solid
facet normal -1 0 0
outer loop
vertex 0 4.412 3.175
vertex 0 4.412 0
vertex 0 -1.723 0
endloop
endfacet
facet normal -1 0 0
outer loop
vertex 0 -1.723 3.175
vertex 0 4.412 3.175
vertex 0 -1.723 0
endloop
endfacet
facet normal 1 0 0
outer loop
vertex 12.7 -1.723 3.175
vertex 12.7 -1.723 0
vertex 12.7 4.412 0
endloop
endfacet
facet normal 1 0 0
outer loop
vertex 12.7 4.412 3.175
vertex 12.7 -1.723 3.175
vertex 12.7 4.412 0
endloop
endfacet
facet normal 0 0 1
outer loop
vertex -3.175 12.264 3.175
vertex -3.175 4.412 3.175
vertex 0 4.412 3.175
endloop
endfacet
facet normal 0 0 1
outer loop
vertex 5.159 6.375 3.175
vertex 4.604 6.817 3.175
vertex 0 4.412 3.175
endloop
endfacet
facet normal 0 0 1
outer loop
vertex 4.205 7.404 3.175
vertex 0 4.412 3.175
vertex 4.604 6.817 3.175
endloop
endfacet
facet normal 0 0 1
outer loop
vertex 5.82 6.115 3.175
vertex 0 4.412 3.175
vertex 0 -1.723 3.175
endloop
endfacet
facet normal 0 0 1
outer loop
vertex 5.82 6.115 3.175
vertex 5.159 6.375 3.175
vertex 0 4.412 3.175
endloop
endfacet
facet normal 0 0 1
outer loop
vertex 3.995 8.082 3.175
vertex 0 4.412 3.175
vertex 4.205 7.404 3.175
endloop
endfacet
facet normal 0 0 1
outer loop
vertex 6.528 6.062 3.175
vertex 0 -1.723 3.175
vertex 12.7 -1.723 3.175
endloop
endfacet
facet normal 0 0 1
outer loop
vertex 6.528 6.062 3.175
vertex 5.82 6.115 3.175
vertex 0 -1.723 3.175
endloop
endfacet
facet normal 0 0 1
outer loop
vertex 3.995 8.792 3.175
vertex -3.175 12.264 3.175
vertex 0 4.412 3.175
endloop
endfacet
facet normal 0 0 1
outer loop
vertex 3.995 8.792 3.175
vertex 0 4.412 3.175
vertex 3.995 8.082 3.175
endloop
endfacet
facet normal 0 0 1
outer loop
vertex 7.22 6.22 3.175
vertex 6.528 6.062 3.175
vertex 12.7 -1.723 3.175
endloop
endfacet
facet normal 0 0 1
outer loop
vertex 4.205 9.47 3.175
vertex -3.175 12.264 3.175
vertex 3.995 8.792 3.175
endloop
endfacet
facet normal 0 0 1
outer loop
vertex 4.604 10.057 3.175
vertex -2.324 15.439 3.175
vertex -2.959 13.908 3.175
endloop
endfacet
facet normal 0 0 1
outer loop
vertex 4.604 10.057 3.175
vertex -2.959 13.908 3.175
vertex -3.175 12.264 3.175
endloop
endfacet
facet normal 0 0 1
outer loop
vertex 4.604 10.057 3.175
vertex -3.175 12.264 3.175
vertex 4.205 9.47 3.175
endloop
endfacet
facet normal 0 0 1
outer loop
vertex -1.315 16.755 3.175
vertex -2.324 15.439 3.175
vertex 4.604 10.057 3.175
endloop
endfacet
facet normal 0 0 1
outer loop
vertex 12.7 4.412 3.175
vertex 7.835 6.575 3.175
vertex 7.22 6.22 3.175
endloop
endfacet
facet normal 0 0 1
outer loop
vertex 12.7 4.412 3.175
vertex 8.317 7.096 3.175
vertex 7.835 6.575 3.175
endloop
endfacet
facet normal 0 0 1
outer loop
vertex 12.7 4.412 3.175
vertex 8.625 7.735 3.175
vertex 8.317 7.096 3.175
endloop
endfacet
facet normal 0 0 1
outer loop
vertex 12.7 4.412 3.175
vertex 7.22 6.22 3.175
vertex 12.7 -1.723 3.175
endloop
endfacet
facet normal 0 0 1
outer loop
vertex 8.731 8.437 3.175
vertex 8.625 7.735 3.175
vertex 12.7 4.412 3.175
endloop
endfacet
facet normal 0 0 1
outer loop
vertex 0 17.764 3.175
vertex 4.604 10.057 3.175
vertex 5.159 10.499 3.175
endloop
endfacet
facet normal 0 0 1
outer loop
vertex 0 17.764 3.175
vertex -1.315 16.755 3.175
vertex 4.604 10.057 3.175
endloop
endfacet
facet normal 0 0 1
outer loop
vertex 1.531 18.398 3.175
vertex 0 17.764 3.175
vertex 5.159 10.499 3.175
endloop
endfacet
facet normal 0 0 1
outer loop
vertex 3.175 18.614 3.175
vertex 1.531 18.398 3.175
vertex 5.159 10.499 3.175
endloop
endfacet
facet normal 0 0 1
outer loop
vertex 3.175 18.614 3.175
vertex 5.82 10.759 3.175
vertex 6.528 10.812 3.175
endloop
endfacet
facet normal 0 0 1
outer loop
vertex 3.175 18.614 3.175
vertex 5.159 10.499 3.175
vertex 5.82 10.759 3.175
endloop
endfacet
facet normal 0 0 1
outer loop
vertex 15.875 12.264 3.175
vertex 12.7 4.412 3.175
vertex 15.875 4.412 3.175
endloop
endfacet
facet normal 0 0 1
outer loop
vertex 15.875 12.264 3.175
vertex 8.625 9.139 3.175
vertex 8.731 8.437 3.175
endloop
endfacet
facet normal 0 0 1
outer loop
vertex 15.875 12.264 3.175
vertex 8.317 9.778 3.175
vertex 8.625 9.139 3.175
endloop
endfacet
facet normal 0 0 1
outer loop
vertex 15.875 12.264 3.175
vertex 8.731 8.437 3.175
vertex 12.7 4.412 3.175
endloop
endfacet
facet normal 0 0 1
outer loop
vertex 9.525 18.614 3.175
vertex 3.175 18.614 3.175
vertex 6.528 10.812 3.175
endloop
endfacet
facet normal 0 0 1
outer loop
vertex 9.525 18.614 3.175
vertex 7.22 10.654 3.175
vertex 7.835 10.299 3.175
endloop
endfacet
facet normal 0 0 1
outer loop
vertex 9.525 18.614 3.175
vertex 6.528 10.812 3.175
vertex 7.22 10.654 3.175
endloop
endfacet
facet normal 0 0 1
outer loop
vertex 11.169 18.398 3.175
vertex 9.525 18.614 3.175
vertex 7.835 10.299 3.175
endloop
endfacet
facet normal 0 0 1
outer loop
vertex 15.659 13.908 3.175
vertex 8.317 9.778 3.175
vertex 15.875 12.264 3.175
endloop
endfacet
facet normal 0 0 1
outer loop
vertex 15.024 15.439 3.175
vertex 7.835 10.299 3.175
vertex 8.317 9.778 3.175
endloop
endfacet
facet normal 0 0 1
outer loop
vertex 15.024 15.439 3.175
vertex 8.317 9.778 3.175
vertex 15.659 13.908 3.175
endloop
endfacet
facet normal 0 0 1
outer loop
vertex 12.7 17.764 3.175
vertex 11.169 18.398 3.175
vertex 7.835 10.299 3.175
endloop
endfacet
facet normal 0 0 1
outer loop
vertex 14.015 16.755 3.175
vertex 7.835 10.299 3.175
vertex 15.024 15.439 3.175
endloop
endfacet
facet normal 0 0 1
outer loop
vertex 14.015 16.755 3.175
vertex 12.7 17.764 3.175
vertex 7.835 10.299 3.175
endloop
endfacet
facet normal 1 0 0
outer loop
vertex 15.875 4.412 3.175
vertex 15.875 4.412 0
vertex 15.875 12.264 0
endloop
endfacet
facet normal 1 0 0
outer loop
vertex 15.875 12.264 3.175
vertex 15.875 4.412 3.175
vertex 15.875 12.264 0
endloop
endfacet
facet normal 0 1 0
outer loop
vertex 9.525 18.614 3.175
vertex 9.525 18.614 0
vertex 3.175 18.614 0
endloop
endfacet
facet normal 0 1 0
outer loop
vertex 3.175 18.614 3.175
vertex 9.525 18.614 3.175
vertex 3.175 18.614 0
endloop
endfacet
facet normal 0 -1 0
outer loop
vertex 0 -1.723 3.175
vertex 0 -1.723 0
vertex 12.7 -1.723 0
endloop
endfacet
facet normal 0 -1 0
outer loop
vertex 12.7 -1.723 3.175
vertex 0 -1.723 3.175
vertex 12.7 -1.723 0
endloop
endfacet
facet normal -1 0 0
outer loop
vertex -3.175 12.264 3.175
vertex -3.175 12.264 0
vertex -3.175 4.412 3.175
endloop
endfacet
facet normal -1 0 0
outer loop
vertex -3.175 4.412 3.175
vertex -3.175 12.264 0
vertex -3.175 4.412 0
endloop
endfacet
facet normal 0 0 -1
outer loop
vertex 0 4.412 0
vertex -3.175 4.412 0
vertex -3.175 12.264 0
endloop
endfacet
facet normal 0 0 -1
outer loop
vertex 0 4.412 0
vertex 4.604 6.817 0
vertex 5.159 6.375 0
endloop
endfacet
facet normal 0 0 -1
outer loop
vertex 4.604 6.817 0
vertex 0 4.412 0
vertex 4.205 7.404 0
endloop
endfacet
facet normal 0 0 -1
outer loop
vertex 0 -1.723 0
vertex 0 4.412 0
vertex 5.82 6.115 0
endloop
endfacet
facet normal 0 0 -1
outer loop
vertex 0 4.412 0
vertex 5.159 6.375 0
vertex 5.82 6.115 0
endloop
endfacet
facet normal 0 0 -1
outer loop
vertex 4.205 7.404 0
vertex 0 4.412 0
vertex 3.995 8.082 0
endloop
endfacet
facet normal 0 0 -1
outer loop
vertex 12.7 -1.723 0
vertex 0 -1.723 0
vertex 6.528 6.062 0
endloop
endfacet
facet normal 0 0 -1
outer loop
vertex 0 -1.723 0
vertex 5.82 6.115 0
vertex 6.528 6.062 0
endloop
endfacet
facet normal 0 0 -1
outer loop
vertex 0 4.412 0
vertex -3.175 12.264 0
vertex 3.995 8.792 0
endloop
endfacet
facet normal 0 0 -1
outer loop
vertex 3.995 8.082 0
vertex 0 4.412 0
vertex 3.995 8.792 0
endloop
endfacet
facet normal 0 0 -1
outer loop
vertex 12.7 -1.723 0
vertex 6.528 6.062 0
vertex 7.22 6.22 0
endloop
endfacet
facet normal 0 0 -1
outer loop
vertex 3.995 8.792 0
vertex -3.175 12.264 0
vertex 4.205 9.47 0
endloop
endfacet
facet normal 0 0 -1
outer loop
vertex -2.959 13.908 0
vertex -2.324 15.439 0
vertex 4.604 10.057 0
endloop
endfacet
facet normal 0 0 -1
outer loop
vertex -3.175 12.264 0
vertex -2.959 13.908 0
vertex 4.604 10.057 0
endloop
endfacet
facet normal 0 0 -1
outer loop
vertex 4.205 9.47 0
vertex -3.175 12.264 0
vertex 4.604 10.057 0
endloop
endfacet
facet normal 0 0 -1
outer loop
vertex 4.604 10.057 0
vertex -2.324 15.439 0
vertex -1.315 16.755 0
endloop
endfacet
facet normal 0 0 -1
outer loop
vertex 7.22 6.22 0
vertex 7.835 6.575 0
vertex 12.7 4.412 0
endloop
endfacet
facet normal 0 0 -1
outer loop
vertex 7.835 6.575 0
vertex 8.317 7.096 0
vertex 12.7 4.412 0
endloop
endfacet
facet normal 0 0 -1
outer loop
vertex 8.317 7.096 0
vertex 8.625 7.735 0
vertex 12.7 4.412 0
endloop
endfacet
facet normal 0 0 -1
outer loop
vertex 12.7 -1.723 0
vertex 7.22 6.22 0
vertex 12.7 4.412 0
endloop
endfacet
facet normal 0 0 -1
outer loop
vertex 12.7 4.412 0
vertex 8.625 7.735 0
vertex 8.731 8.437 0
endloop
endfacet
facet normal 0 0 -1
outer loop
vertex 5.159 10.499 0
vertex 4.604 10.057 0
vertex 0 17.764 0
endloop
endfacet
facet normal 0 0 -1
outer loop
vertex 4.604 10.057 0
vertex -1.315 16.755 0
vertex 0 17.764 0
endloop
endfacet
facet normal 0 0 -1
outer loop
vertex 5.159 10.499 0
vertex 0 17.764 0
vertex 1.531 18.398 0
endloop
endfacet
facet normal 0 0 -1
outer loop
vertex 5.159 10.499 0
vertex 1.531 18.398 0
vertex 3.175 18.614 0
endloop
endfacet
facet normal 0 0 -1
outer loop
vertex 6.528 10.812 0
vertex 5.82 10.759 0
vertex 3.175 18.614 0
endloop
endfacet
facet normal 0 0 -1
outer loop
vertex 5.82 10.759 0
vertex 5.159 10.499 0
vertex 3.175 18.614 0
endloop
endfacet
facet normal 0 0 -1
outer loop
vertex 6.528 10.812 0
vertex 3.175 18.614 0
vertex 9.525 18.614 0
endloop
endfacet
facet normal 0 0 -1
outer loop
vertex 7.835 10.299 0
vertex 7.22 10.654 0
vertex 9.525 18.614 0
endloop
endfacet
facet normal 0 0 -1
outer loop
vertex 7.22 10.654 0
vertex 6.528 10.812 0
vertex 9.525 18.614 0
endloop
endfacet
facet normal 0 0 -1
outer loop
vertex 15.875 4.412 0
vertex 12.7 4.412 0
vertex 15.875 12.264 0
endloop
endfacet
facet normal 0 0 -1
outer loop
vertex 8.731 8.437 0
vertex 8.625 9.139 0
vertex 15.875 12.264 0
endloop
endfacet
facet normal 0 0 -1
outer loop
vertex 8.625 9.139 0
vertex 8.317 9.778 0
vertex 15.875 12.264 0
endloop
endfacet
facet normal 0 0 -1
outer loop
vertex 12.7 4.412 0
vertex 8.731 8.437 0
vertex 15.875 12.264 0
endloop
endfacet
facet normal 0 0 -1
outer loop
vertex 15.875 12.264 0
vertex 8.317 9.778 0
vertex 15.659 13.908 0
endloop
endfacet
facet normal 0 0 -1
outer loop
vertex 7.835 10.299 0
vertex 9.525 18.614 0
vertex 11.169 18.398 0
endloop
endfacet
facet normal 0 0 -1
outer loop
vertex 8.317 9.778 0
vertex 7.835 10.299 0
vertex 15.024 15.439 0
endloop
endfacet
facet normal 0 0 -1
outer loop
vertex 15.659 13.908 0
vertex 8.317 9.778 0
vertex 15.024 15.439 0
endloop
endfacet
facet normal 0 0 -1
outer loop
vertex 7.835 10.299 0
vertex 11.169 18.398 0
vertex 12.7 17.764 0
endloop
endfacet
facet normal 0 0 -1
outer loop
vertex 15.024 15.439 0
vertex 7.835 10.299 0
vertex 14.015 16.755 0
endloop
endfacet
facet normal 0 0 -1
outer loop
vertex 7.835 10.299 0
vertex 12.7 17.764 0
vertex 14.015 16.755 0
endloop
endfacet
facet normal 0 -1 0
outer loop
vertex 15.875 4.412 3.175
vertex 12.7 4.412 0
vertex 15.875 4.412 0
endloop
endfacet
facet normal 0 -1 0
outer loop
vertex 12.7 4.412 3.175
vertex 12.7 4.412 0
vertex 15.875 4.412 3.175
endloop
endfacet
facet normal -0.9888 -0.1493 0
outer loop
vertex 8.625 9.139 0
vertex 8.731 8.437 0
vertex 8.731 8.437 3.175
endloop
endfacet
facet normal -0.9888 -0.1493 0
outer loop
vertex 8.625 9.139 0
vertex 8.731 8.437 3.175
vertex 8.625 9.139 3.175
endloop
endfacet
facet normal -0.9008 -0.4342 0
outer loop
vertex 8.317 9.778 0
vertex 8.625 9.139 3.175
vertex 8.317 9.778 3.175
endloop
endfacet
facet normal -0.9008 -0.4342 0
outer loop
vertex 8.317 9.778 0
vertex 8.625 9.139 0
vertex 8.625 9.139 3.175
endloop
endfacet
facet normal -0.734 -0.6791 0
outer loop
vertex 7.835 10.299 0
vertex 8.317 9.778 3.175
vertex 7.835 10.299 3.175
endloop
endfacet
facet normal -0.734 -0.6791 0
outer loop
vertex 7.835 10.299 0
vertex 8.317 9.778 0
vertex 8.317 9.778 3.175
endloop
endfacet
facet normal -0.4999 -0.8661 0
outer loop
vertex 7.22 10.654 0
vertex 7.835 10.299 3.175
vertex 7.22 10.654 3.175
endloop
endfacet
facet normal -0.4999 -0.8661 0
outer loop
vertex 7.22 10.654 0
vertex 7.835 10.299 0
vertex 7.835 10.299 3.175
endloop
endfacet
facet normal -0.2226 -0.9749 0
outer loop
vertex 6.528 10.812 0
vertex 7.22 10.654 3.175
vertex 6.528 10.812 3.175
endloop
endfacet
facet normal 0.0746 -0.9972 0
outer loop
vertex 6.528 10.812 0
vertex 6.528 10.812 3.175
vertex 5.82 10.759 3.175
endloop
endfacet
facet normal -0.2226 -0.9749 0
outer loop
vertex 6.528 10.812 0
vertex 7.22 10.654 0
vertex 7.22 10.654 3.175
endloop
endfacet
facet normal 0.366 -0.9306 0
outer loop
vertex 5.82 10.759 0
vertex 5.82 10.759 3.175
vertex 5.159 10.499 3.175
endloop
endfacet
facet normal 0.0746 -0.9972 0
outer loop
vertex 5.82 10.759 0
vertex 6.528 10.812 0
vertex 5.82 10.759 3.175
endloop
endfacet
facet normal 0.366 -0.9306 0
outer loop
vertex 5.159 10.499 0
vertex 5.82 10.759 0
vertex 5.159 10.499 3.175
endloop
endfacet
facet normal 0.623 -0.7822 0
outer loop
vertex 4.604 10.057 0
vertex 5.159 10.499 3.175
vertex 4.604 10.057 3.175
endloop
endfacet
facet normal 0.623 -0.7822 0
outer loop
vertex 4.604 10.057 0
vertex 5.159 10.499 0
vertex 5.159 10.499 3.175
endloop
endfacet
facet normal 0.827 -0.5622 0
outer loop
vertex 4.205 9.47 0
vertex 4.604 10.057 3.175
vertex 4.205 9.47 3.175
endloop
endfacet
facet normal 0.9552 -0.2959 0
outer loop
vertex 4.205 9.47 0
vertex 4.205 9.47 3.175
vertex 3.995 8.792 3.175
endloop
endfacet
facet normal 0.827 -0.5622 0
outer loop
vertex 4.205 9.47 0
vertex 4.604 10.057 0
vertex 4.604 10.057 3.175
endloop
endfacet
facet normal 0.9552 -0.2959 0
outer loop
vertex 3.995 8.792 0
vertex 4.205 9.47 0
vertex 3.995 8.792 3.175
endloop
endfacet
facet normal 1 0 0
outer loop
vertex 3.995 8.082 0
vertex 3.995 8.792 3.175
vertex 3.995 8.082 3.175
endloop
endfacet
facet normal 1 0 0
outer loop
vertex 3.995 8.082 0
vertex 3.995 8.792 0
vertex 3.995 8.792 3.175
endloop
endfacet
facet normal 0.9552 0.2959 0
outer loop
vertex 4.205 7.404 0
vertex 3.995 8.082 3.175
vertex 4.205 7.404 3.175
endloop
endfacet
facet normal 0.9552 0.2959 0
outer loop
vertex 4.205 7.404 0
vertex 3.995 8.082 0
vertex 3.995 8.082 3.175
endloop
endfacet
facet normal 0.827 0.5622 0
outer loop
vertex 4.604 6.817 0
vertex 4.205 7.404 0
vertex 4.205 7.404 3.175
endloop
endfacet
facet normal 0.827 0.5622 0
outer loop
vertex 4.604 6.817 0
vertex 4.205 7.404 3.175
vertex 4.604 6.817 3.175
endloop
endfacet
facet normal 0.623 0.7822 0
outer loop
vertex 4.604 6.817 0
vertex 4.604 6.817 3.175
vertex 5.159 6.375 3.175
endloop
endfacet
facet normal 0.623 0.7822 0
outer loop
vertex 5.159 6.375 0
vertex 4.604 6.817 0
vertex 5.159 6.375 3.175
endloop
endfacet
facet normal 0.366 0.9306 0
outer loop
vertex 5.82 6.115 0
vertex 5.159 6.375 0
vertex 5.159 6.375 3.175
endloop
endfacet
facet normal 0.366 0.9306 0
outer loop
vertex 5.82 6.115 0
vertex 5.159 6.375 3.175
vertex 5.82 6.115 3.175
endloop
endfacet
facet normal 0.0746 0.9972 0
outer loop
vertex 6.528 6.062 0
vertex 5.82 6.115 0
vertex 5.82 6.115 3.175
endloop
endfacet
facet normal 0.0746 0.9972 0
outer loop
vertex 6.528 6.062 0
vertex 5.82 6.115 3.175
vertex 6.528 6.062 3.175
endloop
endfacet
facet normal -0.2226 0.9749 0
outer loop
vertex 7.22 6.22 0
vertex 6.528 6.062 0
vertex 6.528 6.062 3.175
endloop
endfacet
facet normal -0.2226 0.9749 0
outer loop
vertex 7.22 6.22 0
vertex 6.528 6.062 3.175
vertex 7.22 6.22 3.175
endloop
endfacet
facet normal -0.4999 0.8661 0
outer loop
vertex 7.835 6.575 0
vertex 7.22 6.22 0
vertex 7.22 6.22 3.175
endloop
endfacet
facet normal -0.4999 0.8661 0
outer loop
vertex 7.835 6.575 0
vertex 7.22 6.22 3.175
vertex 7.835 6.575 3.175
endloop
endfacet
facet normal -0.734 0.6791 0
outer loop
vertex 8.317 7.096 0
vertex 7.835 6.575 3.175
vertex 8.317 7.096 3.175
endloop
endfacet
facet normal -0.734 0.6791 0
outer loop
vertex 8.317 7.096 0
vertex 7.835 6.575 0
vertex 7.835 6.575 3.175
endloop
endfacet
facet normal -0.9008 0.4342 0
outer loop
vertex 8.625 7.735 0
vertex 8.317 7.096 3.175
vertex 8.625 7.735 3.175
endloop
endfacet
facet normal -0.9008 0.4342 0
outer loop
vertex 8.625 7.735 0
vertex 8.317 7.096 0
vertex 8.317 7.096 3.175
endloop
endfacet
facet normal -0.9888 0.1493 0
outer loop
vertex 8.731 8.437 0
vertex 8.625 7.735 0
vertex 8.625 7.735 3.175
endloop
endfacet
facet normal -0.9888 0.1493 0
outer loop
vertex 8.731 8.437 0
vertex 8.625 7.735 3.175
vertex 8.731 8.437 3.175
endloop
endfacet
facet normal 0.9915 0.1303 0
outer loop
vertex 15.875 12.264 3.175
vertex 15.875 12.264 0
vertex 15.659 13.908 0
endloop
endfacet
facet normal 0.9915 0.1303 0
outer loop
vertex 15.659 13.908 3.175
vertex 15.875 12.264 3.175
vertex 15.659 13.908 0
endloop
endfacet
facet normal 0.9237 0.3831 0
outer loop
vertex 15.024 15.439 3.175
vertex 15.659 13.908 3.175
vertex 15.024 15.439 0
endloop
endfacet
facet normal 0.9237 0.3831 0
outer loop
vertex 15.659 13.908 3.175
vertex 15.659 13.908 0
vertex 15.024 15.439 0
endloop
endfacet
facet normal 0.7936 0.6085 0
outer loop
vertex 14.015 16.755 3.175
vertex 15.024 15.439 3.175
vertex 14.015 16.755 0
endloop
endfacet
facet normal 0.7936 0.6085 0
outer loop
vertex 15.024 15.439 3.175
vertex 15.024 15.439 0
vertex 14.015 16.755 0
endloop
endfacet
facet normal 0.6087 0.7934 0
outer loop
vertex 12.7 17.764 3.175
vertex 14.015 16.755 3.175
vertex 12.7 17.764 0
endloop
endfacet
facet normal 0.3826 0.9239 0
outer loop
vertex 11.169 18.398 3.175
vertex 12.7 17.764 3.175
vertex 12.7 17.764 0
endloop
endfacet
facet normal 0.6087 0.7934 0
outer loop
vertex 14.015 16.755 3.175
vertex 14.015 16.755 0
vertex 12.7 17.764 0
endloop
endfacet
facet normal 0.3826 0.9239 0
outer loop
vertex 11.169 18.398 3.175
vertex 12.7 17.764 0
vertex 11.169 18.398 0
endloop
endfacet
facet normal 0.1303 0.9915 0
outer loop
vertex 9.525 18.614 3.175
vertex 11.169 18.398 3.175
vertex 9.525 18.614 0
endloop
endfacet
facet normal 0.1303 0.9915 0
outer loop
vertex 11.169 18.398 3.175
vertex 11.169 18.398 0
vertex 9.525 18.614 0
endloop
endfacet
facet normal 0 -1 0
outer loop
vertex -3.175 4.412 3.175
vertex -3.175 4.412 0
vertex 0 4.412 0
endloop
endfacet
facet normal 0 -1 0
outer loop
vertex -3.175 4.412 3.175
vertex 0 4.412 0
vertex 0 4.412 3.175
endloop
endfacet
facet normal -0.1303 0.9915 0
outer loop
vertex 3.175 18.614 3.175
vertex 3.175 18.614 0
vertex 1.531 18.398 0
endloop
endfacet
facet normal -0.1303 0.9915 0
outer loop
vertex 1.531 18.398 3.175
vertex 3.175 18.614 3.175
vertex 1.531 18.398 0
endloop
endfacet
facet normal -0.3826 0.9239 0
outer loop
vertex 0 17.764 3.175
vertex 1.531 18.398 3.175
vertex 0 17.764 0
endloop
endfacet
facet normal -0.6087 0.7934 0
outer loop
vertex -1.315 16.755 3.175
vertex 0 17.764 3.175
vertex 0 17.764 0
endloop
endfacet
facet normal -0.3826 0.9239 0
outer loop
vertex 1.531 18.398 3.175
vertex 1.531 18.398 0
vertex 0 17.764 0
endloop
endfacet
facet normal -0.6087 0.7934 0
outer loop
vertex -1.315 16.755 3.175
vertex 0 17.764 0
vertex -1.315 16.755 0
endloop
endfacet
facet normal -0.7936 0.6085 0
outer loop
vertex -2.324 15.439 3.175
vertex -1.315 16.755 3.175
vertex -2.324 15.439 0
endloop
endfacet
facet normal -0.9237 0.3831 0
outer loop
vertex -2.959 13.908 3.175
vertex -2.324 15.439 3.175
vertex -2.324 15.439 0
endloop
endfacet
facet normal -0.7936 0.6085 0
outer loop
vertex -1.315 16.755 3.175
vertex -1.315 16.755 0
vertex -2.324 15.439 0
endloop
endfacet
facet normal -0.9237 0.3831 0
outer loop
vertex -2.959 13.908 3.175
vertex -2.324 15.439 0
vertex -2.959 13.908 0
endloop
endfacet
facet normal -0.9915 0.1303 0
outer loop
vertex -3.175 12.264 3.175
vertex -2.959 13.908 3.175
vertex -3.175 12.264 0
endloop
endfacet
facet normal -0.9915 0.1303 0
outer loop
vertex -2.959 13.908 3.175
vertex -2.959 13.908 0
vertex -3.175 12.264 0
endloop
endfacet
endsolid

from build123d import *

# Parameters (mm, degrees)
SKETCH1_R           = 2.38125
BOSS_EXTRUDE1_DEPTH = 3.175
CAVITY1_START       = -3.175
CAVITY1_OUTLINE_W   = 1.236627981
CAVITY1_OUTLINE_H   = 3.175
CAVITY1_DEPTH       = 3.175
CAVITY1_START_2     = 12.7
CAVITY1_2_OUTLINE_W = 1.236627981
CAVITY1_2_OUTLINE_H = 3.175
CAVITY1_2_DEPTH     = 3.175


# Read off the part's stored shape, not the designer's step: Cavity1
with BuildPart() as part:
    # Sketch1 → Boss-Extrude1 (new body)
    with BuildSketch(Plane.XY):
        with BuildLine():
            Line((0, -1.722993842), (12.7, -1.722993842))
            Line((12.7, -1.722993842), (12.7, 3.175))
            Line((12.7, 3.175), (15.875, 3.175))
            Line((15.875, 3.175), (15.875, 12.264476338))
            ThreePointArc((15.875, 12.264476338), (14.015128061, 16.754604399), (9.525, 18.614476338))
            Line((9.525, 18.614476338), (3.175, 18.614476338))
            ThreePointArc((3.175, 18.614476338), (-1.315128061, 16.754604399), (-3.175, 12.264476338))
            Line((-3.175, 12.264476338), (-3.175, 3.175))
            Line((-3.175, 3.175), (0, 3.175))
            Line((0, 3.175), (0, -1.722993842))
        make_face()
        with Locations((6.35, 8.437006158)):
            Circle(SKETCH1_R, mode=Mode.SUBTRACT)
    extrude(amount=BOSS_EXTRUDE1_DEPTH)

    # Cavity1 outline → Cavity1 (cut)
    with BuildSketch(Plane.YZ.offset(CAVITY1_START)):
        with Locations((3.793313991, 1.5875)):
            Rectangle(CAVITY1_OUTLINE_W, CAVITY1_OUTLINE_H)
    extrude(amount=CAVITY1_DEPTH, mode=Mode.SUBTRACT)

    # Cavity1 2 outline → Cavity1 2 (cut)
    with BuildSketch(Plane.YZ.offset(CAVITY1_START_2)):
        with Locations((3.793313991, 1.5875)):
            Rectangle(CAVITY1_2_OUTLINE_W, CAVITY1_2_OUTLINE_H)
    extrude(amount=CAVITY1_2_DEPTH, mode=Mode.SUBTRACT)


solid = part.part
